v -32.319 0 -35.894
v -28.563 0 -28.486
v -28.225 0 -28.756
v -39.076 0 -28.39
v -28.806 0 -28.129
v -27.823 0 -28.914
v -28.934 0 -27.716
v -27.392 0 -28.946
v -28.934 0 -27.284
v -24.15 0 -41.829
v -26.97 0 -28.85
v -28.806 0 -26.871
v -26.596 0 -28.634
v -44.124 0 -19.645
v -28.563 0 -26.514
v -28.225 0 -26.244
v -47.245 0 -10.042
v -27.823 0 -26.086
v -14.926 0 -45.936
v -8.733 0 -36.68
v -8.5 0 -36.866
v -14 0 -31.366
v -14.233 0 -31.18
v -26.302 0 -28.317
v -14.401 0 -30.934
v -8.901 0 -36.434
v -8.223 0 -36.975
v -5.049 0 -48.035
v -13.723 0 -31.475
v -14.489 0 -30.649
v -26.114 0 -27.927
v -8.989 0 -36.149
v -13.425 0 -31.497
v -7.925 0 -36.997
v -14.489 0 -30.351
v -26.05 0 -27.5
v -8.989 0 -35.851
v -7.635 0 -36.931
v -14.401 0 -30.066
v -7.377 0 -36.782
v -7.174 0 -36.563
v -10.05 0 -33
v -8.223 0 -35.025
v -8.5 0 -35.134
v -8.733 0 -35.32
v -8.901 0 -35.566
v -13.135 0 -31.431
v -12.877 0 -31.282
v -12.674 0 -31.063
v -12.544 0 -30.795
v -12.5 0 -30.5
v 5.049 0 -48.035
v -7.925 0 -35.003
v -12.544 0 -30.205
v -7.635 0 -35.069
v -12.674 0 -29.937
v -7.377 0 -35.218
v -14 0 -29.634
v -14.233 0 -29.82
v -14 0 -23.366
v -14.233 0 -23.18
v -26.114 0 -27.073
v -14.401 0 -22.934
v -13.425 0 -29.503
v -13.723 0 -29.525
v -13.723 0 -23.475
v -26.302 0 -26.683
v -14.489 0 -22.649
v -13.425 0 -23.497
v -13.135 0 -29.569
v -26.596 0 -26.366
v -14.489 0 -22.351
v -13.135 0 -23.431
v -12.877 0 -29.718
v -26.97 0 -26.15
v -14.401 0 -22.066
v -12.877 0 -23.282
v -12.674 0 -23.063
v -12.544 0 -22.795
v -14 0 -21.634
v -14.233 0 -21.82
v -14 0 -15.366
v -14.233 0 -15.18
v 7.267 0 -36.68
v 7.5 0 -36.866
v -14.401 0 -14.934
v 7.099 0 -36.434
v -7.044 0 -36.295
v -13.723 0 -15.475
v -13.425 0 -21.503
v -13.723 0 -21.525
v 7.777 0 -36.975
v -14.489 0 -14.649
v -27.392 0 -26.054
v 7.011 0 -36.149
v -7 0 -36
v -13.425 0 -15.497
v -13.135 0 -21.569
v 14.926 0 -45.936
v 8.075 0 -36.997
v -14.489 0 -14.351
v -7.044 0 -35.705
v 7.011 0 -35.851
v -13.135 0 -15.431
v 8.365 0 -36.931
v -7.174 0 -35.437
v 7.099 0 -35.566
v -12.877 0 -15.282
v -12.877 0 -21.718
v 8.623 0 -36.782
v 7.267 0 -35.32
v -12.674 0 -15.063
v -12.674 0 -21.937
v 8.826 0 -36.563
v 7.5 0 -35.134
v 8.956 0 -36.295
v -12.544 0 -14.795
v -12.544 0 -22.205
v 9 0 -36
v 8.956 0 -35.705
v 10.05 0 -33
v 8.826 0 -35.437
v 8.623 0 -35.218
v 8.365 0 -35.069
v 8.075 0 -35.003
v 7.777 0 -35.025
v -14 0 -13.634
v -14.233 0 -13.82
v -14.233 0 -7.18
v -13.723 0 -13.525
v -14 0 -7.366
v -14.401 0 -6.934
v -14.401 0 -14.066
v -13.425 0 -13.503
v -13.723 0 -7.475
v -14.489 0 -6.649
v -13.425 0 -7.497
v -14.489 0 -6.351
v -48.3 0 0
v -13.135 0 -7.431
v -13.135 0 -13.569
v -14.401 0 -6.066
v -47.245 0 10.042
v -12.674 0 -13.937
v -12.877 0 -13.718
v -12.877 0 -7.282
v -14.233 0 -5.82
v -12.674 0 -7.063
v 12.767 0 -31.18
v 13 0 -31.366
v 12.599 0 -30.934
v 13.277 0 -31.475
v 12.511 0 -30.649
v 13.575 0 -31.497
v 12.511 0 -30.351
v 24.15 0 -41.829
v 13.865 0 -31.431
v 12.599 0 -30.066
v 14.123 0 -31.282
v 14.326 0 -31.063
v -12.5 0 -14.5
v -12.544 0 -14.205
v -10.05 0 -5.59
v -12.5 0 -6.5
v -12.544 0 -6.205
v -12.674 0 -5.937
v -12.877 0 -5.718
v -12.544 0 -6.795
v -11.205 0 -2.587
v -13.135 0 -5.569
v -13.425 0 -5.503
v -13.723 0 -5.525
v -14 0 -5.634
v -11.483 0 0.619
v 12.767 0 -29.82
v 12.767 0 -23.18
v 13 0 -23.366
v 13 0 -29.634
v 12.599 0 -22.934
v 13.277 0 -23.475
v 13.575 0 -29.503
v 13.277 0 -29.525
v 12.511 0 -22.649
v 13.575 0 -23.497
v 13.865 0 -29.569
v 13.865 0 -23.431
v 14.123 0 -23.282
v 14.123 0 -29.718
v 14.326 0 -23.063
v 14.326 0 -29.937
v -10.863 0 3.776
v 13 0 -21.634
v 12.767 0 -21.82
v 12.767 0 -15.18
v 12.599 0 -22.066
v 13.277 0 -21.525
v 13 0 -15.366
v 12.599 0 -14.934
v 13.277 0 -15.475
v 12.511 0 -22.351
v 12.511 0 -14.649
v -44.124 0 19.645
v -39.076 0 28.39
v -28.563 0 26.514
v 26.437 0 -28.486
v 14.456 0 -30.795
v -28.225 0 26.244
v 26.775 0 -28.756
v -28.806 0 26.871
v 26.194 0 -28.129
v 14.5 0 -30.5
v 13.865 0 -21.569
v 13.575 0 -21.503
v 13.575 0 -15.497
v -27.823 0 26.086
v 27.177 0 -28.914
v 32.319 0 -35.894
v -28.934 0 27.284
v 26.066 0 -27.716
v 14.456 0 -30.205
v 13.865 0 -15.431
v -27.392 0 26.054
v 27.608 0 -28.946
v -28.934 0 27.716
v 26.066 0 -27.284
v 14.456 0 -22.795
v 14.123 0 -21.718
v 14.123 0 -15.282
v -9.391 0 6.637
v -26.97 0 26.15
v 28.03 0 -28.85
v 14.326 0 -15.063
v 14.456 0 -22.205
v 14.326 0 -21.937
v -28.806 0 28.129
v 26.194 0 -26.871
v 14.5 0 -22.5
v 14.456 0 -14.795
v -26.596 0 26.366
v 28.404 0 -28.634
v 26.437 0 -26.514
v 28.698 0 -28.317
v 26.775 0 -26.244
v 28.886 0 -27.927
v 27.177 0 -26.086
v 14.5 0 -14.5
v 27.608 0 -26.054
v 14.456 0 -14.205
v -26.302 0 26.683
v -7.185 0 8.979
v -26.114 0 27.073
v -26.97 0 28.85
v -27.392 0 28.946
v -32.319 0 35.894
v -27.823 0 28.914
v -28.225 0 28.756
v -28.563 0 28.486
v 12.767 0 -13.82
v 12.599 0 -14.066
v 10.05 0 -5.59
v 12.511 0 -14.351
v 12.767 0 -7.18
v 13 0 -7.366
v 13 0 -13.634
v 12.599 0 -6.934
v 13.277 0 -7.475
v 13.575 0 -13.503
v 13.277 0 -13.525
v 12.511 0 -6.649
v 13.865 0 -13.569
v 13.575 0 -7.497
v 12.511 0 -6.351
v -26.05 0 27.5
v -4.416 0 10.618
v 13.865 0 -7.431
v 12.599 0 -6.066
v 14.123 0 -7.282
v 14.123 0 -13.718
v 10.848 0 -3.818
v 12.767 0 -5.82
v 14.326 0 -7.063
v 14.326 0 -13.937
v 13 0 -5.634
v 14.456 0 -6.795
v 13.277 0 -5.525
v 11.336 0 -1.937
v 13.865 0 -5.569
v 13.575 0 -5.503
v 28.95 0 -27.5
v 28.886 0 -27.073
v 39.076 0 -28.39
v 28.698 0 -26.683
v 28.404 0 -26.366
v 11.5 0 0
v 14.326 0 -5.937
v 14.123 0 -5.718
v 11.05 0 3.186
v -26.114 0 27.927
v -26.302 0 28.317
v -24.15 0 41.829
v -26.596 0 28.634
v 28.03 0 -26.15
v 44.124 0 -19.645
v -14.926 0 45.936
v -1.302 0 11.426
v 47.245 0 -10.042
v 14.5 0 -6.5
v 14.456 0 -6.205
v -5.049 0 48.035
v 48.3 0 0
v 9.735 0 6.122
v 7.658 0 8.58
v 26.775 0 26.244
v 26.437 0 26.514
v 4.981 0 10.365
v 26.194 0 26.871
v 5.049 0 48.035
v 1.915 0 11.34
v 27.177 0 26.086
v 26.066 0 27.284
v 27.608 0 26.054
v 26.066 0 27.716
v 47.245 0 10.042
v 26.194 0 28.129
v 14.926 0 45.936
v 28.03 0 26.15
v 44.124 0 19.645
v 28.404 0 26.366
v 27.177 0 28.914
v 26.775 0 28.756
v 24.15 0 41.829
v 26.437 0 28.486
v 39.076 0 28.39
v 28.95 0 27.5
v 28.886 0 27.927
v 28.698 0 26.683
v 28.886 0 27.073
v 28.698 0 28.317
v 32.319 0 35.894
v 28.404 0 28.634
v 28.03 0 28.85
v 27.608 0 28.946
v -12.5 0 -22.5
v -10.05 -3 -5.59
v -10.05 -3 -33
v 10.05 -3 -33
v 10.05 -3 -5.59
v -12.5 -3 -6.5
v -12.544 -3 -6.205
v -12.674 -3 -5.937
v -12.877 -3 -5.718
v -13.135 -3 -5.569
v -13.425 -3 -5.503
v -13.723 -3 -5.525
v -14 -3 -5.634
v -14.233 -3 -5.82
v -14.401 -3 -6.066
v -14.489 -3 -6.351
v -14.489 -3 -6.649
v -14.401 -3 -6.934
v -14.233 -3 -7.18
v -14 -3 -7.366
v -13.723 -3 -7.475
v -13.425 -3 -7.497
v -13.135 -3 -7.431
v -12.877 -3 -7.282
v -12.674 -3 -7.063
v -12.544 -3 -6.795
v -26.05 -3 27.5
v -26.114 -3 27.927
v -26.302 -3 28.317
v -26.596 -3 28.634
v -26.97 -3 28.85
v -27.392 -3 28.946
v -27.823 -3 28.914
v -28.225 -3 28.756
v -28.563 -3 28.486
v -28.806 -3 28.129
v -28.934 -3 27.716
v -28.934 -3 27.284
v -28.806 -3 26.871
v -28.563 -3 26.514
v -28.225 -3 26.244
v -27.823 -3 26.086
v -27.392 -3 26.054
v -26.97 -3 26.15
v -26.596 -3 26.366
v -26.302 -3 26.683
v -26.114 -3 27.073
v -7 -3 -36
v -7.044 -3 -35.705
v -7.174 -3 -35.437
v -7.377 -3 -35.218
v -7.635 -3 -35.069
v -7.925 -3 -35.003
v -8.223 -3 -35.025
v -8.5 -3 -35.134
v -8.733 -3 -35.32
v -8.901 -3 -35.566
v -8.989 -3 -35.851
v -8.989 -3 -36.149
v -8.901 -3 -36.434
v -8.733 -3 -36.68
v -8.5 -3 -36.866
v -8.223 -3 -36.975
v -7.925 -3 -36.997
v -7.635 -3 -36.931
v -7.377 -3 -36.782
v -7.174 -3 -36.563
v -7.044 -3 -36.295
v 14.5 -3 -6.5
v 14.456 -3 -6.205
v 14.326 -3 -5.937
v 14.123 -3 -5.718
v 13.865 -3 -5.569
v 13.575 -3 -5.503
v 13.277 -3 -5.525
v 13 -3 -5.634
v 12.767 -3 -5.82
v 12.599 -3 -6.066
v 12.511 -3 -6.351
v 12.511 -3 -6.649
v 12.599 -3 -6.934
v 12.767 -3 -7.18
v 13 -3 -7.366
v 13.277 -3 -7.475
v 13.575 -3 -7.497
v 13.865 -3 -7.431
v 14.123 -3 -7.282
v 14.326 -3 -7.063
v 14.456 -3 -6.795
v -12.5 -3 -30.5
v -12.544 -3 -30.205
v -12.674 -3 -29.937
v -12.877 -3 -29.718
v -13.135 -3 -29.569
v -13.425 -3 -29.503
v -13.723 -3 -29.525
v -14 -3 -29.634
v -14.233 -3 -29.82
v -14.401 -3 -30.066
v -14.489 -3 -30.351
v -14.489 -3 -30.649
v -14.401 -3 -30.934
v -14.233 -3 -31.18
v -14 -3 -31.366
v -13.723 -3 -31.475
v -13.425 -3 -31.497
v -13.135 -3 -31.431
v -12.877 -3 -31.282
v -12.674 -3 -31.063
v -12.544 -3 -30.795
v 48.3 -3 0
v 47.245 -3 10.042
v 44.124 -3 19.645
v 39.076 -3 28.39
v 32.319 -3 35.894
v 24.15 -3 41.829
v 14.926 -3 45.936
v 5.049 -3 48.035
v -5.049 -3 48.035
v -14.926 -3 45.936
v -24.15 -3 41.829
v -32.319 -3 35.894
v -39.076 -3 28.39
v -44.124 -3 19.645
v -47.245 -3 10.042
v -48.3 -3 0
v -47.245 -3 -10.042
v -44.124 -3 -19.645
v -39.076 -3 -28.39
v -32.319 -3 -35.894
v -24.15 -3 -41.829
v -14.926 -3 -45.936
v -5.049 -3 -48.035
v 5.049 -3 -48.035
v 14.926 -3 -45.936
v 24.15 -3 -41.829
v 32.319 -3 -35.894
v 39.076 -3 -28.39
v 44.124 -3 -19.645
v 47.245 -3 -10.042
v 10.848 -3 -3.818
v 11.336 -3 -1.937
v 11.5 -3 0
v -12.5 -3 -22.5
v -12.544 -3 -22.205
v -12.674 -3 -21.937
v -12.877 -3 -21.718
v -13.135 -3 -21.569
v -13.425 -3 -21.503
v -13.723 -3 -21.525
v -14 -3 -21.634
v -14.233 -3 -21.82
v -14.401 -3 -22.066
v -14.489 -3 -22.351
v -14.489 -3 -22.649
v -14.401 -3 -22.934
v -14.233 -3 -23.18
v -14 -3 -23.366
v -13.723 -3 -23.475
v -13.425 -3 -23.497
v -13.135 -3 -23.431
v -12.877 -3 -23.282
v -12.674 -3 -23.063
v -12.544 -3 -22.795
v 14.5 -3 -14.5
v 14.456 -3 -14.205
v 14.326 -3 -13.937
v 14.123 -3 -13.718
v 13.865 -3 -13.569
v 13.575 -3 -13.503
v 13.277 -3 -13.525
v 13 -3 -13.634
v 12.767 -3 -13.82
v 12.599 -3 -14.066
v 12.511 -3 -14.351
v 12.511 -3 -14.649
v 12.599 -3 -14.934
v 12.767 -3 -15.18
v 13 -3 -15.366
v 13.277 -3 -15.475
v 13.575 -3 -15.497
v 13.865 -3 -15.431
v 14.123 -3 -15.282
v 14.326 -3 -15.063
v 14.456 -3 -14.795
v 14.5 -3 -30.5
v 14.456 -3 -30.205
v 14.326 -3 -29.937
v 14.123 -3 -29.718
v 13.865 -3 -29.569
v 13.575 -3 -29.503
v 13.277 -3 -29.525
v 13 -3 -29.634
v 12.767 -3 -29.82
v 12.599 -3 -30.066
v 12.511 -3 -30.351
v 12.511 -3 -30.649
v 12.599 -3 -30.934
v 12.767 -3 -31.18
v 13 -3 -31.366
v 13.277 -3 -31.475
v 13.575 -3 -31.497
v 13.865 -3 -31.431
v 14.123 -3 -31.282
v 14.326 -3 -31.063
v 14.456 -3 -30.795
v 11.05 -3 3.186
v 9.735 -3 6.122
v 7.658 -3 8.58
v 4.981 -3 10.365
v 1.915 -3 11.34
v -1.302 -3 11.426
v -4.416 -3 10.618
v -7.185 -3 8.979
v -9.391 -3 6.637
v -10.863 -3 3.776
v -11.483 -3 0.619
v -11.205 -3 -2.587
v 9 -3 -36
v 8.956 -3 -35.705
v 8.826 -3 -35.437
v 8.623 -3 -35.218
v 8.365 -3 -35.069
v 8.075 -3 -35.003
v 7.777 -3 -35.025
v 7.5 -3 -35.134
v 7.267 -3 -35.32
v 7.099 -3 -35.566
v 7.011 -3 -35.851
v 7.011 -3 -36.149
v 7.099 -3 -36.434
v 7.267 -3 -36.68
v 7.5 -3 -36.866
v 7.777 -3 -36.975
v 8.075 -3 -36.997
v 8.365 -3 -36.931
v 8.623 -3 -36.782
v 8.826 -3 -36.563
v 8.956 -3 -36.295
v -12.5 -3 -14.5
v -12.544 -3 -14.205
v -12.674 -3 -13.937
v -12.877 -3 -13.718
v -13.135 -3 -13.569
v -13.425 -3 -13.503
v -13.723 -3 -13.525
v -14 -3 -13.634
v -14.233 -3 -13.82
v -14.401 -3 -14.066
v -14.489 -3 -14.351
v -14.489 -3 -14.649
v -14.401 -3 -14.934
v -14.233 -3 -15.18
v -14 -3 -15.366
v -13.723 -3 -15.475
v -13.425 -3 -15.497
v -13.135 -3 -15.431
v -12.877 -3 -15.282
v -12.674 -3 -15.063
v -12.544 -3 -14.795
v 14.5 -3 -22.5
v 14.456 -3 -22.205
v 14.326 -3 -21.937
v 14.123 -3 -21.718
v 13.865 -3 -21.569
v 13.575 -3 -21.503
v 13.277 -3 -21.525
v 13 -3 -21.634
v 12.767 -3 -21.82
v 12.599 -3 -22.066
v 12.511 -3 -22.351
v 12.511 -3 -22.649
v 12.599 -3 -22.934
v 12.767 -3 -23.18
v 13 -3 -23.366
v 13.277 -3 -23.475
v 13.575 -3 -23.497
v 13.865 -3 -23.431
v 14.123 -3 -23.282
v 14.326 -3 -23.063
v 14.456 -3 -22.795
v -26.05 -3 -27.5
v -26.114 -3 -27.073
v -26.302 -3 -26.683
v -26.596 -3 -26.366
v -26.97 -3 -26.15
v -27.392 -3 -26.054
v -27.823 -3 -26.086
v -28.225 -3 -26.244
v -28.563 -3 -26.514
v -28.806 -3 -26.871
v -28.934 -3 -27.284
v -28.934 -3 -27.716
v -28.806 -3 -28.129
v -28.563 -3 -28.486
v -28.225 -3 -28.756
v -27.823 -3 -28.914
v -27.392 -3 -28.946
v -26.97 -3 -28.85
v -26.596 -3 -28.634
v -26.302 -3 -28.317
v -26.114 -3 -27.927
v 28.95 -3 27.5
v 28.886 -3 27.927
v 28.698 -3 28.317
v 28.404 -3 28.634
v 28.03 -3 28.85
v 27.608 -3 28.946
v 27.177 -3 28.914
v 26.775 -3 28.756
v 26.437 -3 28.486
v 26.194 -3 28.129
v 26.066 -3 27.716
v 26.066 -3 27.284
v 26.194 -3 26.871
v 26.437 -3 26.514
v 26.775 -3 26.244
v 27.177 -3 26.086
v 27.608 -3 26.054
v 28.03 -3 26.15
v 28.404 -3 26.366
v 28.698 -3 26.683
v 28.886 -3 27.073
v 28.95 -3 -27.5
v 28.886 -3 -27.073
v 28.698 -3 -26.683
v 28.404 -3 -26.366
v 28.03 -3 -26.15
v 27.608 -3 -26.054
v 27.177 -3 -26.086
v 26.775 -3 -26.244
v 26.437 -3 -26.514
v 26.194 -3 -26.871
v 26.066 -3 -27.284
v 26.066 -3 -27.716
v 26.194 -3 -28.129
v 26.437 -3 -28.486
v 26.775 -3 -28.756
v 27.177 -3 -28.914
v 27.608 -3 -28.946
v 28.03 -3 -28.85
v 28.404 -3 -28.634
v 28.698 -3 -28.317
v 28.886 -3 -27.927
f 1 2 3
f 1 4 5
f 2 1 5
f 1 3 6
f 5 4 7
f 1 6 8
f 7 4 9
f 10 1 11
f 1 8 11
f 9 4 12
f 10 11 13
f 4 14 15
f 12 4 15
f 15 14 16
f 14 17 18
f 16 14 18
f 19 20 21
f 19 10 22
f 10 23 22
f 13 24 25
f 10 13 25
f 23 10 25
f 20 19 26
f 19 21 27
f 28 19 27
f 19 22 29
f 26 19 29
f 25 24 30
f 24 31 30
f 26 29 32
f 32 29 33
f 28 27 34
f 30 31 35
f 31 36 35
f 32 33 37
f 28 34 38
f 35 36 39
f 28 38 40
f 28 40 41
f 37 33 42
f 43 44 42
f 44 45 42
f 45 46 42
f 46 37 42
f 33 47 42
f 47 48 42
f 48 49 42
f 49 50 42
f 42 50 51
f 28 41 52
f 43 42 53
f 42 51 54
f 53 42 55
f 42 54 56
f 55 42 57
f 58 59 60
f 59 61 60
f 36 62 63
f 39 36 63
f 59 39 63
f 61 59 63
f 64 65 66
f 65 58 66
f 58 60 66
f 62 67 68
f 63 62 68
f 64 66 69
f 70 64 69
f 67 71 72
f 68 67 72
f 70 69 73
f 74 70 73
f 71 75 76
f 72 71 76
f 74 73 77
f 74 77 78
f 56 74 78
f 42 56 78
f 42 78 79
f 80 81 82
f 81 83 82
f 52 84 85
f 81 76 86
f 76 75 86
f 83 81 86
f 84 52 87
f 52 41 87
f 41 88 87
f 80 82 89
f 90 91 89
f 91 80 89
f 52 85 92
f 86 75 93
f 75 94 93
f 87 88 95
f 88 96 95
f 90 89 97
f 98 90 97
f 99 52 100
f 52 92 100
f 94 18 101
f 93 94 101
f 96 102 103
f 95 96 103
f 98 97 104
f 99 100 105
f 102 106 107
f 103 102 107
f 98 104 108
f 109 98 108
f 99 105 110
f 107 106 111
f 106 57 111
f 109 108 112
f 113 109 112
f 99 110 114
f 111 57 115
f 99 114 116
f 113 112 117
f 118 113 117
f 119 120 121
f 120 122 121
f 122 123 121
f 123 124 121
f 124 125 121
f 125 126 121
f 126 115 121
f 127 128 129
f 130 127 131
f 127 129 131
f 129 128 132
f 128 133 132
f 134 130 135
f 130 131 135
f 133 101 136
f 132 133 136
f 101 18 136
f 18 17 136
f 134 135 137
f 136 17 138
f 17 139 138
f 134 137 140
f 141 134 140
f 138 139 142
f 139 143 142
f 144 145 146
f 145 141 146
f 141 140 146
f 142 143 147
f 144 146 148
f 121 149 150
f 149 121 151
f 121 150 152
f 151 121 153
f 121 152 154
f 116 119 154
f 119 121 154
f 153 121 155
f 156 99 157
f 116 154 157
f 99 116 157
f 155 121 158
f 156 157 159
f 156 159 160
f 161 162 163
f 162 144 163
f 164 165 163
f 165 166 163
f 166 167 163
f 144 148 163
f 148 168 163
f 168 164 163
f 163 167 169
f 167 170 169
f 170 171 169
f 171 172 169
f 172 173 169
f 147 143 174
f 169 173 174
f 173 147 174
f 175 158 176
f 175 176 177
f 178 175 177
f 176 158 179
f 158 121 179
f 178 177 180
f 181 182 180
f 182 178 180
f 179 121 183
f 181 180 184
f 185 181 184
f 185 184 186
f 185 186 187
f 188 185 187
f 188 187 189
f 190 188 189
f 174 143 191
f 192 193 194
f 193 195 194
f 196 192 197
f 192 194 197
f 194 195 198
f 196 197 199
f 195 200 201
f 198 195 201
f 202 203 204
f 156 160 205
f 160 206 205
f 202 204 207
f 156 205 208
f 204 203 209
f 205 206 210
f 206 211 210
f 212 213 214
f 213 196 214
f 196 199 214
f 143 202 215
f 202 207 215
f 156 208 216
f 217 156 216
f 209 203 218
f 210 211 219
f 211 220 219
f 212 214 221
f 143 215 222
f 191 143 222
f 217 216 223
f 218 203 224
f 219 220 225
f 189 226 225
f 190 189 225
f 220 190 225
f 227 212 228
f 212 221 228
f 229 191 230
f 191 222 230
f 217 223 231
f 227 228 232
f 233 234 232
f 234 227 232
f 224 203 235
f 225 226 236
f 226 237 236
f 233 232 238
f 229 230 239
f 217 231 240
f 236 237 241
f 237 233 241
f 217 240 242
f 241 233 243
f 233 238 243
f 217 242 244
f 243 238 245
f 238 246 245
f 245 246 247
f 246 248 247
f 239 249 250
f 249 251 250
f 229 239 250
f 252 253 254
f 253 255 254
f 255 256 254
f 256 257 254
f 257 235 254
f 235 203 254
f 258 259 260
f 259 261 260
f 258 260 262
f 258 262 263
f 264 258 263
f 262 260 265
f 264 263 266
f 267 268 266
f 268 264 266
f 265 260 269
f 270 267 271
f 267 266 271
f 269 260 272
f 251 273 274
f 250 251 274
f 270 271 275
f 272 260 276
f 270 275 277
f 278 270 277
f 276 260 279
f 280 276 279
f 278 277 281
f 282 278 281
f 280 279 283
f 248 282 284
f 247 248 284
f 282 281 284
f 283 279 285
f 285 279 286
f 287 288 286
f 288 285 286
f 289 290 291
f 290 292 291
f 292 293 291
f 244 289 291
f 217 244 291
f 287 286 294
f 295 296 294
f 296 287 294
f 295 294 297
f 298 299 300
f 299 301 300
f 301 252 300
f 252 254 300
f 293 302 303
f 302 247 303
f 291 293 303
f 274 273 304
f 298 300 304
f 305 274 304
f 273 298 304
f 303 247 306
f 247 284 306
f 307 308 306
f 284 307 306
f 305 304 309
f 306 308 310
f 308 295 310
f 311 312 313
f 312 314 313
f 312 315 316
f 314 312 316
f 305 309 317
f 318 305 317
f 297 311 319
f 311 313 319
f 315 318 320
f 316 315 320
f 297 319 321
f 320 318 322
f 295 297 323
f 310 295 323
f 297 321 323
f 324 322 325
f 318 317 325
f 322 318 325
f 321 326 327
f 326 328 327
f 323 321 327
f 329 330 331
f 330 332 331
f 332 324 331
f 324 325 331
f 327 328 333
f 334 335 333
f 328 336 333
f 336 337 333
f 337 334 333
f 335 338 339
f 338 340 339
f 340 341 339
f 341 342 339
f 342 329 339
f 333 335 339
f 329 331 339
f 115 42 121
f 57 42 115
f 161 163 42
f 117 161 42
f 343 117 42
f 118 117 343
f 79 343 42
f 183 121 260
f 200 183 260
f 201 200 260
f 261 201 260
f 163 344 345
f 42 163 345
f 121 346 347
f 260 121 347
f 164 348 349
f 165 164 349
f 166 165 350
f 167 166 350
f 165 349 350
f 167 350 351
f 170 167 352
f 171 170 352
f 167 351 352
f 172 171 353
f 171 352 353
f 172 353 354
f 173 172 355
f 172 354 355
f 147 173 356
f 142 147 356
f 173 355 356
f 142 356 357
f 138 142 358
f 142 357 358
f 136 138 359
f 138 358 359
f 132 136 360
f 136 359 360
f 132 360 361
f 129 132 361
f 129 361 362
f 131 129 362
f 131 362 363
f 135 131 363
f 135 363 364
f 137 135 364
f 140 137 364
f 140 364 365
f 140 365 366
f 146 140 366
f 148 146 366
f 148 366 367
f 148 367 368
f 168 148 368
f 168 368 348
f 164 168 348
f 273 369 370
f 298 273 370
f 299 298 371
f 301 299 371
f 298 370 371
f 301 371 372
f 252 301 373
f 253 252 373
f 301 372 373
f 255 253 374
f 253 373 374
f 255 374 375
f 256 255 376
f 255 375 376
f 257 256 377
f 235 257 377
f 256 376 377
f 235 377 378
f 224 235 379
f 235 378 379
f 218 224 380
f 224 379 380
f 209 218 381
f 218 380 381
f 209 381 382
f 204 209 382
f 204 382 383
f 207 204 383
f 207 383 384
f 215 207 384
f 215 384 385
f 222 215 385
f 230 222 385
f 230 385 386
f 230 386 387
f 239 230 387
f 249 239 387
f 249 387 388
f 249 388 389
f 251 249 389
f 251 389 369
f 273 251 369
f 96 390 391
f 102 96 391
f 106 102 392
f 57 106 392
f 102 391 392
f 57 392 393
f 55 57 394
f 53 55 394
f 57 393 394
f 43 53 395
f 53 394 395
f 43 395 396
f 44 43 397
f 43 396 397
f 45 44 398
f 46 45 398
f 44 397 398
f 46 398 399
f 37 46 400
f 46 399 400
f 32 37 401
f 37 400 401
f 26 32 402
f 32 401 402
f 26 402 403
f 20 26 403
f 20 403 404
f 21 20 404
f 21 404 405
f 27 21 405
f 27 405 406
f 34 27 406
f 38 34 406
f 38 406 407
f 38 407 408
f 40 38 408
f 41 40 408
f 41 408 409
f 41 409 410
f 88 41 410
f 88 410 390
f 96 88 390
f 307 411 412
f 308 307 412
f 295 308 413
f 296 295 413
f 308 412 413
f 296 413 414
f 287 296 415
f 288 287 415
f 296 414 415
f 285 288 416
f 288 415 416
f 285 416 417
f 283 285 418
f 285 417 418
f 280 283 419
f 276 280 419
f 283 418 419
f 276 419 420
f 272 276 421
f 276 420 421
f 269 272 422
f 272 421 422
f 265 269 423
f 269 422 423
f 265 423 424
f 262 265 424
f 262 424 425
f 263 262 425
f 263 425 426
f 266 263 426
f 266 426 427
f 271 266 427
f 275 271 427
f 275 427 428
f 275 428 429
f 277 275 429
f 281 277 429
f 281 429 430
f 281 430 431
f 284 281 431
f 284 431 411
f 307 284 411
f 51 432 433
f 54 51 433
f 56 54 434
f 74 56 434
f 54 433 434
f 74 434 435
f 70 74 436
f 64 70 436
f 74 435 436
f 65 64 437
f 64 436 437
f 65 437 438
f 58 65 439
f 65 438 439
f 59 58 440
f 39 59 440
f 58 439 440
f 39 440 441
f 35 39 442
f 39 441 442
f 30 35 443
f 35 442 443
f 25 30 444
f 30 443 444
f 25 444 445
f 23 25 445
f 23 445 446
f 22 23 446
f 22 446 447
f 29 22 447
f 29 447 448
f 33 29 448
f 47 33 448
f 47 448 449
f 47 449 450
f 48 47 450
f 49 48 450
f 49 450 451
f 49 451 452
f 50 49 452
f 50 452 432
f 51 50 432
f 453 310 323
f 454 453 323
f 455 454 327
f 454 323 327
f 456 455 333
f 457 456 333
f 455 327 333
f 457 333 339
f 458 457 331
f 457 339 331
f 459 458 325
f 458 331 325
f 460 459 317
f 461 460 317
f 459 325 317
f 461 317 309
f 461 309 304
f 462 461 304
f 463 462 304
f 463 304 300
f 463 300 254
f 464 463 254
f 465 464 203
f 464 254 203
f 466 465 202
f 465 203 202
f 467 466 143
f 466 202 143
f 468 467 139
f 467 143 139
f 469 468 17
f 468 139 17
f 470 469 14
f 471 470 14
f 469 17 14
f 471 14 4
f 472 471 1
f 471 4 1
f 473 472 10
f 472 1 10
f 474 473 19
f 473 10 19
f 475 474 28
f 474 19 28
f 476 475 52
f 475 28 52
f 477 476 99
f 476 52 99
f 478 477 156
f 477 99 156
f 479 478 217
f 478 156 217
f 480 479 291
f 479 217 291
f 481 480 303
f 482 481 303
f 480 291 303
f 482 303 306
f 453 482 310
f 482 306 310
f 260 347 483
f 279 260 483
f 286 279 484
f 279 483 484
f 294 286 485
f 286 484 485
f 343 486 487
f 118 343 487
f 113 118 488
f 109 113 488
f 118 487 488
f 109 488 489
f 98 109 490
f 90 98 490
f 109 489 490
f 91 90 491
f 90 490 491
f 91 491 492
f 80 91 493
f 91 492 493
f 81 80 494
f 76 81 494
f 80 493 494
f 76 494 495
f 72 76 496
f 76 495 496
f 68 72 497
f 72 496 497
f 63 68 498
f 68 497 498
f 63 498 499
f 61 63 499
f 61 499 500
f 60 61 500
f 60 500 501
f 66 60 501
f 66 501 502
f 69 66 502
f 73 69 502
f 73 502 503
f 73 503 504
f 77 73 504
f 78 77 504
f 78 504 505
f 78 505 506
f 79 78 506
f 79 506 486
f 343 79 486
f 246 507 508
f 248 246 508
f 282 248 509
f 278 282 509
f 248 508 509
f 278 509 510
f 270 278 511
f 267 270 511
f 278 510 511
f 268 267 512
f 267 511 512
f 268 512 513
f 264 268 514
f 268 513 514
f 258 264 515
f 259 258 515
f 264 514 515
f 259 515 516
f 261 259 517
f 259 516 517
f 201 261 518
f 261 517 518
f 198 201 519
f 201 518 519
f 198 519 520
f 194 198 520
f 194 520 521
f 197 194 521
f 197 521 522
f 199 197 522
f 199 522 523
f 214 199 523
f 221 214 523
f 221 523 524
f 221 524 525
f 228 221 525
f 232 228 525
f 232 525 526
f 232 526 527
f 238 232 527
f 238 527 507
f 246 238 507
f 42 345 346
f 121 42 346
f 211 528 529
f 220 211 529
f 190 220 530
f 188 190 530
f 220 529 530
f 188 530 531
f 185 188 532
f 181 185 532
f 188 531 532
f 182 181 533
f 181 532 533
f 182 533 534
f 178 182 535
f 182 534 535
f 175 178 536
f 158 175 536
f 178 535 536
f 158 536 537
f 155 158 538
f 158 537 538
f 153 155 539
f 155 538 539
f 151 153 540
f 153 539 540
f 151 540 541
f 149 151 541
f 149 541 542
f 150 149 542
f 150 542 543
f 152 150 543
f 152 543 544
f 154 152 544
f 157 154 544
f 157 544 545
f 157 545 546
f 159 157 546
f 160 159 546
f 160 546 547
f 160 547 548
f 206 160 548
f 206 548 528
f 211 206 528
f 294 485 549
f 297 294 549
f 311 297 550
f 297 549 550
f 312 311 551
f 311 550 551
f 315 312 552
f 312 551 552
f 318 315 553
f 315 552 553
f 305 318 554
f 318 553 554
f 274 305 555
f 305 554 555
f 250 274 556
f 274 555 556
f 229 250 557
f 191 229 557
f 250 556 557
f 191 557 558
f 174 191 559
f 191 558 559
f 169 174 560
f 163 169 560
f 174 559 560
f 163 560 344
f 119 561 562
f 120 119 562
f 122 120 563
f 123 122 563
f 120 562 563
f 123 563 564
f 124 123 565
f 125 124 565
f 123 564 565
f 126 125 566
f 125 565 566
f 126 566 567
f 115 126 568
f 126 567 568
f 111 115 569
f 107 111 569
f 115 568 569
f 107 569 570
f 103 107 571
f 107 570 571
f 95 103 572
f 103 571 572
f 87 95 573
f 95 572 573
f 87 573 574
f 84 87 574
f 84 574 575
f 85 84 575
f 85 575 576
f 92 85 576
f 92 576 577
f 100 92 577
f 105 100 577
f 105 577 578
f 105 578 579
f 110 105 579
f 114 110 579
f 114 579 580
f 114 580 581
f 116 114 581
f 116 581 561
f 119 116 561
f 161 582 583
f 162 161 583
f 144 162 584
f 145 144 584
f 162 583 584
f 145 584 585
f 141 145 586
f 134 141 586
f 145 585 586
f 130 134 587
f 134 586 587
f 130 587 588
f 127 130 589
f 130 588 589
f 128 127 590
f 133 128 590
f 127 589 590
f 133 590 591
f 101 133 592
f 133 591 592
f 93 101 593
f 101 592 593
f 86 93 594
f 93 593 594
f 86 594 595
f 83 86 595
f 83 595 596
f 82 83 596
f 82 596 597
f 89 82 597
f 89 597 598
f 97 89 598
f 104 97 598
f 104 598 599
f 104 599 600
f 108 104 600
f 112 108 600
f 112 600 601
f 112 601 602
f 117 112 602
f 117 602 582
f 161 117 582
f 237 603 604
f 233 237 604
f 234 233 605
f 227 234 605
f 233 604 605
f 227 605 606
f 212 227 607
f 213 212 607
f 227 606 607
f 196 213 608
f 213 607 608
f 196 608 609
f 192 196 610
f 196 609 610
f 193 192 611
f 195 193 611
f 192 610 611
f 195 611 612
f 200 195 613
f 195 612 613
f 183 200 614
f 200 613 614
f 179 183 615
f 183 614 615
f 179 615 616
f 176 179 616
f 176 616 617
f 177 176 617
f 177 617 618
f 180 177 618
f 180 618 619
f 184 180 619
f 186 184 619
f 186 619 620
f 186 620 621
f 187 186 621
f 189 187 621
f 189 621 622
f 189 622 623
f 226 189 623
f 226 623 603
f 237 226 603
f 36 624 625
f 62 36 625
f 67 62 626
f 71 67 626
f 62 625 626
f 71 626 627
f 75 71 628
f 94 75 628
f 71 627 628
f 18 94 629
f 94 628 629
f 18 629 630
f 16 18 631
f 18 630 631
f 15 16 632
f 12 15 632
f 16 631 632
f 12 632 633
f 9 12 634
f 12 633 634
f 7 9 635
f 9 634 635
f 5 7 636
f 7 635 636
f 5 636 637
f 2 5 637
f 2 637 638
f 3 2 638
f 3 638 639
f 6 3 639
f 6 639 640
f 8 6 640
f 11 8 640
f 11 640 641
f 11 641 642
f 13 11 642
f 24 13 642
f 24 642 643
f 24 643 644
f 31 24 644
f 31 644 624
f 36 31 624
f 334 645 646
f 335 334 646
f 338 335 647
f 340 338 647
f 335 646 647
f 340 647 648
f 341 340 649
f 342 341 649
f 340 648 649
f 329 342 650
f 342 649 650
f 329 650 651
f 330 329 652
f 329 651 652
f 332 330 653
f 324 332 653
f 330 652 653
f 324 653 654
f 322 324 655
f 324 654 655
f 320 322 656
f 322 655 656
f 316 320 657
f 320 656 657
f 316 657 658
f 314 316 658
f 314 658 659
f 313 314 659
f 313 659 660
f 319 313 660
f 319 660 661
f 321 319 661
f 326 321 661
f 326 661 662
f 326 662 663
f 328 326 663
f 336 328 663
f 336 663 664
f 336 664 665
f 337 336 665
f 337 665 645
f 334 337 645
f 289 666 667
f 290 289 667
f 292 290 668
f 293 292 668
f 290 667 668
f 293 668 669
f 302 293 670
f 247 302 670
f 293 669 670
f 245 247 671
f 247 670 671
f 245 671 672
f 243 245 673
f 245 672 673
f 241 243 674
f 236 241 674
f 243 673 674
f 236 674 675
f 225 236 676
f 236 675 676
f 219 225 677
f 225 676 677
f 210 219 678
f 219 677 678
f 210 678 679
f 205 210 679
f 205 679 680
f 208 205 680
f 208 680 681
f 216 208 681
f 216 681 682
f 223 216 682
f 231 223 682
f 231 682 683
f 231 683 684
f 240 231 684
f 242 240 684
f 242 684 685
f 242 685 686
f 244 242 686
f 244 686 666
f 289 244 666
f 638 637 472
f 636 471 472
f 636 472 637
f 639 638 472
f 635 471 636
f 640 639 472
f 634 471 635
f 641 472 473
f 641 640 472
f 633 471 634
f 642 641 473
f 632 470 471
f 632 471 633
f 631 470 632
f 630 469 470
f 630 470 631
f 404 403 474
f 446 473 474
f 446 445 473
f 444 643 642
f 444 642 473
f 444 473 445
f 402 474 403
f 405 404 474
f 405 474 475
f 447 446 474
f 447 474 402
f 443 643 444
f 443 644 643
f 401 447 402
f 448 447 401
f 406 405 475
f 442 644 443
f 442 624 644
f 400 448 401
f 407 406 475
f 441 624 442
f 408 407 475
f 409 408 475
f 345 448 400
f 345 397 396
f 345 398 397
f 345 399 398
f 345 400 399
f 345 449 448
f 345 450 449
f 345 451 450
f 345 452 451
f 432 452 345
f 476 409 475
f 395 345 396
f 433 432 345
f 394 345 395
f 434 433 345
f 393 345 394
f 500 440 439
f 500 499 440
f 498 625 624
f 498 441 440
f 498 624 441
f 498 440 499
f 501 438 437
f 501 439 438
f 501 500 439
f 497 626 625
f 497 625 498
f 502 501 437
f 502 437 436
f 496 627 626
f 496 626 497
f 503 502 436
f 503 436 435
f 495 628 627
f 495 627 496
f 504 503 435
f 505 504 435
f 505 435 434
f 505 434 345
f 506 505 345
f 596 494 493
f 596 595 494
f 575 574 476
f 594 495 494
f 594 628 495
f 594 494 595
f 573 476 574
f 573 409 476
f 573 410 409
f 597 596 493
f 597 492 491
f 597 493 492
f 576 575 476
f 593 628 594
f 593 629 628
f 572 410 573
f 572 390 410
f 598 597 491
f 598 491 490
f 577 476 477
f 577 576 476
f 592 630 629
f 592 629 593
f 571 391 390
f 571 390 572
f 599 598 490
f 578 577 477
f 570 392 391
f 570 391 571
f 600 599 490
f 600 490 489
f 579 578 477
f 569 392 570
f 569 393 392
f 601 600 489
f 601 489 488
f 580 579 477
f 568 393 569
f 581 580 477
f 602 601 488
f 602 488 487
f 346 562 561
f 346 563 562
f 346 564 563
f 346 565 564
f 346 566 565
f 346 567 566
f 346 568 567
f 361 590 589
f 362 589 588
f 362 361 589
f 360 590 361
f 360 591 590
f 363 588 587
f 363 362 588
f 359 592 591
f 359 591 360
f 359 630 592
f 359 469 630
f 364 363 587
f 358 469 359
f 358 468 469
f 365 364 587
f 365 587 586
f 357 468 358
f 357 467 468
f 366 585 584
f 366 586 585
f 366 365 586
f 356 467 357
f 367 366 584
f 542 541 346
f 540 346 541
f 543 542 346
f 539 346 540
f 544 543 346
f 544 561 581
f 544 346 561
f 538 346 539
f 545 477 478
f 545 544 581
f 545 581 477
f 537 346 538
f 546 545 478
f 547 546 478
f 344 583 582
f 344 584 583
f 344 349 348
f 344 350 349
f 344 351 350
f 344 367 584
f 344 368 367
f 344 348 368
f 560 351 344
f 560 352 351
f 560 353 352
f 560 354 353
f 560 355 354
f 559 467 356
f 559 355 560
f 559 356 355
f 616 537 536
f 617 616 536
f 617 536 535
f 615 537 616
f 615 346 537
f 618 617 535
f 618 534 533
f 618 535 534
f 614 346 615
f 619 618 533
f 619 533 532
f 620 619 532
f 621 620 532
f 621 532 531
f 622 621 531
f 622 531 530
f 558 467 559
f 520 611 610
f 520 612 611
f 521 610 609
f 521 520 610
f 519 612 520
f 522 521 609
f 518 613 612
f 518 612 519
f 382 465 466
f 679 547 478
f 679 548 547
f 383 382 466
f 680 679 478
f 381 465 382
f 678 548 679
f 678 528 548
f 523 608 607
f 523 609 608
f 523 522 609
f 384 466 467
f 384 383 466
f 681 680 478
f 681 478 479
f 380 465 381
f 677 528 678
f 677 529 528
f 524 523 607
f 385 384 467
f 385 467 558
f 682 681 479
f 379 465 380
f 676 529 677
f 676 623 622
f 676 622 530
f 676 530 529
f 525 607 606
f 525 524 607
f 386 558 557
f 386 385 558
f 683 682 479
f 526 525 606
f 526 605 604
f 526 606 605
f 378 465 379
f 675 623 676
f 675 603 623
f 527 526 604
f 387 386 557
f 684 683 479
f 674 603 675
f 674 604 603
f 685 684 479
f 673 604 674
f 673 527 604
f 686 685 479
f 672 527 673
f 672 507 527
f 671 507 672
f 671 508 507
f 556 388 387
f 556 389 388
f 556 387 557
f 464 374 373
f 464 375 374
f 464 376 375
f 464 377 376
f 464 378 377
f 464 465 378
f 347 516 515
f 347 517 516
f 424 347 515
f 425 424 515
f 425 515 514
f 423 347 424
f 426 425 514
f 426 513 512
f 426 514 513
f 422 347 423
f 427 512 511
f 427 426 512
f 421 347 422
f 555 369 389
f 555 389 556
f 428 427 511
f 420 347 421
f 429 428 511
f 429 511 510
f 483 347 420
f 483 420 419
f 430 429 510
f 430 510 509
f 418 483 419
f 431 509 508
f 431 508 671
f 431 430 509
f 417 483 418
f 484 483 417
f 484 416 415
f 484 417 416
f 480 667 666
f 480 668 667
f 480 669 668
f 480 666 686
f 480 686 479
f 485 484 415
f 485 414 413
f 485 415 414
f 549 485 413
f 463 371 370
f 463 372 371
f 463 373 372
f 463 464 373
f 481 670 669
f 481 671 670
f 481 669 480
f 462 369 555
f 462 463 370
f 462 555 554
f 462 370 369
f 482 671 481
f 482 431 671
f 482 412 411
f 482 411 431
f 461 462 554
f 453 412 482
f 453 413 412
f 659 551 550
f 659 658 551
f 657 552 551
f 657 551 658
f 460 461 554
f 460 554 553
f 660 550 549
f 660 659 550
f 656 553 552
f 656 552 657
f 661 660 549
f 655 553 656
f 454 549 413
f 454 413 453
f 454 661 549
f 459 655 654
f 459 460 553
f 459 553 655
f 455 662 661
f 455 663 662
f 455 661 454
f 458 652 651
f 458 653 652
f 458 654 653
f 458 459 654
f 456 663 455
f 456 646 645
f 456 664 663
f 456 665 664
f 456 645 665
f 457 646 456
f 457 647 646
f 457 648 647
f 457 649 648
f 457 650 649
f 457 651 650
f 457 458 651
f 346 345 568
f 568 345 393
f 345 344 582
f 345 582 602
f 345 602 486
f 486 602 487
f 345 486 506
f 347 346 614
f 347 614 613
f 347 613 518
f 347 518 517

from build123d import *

# Parameters (mm, degrees)
F0_R     = 48.3
F1_DEPTH = 3
F2_R     = 1.25
F2_R_2   = 2.5
F3_DEPTH = 3.001
F4_R     = 1.45
F5_DEPTH = 3.001
F6_R     = 1
F7_DEPTH = 3.001


with BuildPart() as f1:
    # F0 (on Front) → F1 (new body)
    with BuildSketch(Plane.XZ):
        Circle(F0_R)
    extrude(amount=F1_DEPTH)

    # F2 (on face) → F3 (cut, through all)
    with BuildSketch(Plane.XZ.offset(3)):
        with Locations((-8, 0)):
            Circle(F2_R)
        with Locations((8, 0)):
            Circle(F2_R)
        Circle(F2_R_2)
    extrude(amount=-F3_DEPTH, mode=Mode.SUBTRACT)

    # F4 (on face) → F5 (cut, through all)
    with BuildSketch(Plane.XZ.offset(3)):
        with Locations((-27.5, 27.5)):
            Circle(F4_R)
        with Locations((27.5, 27.5)):
            Circle(F4_R)
        with Locations((-27.5, -27.5)):
            Circle(F4_R)
        with Locations((27.5, -27.5)):
            Circle(F4_R)
    extrude(amount=-F5_DEPTH, mode=Mode.SUBTRACT)

    # F6 (on face) → F7 (cut, through all)
    with BuildSketch(Plane.XZ.offset(3)):
        with BuildLine():
            Line((-10.05, -33), (10.05, -33))
            Line((10.05, -33), (10.05, -5.5899463325))
            ThreePointArc((10.05, -5.5899463325), (0, -11.5), (-10.05, -5.5899463325))
            Line((-10.05, -5.5899463325), (-10.05, -33))
        make_face()
        with BuildLine():
            ThreePointArc((-10.05, -5.5899463325), (0, -11.5), (10.05, -5.5899463325))
            Line((10.05, -5.5899463325), (10.05, 0))
            Line((10.05, 0), (-10.05, 0))
            Line((-10.05, 0), (-10.05, -5.5899463325))
        make_face()
        with BuildLine():
            Line((10.05, 0), (10.05, -5.5899463325))
            ThreePointArc((10.05, -5.5899463325), (11.1315991663, -2.8874729436), (11.5, 0))
            ThreePointArc((11.5, 0), (-2.8874729436, 11.1315991663), (-10.05, -5.5899463325))
            Line((-10.05, -5.5899463325), (-10.05, 0))
            Line((-10.05, 0), (10.05, 0))
        make_face()
        with Locations((-13.5, -6.5)):
            Circle(F6_R)
        with Locations((-13.5, -14.5)):
            Circle(F6_R)
        with Locations((-13.5, -22.5)):
            Circle(F6_R)
        with Locations((-13.5, -30.5)):
            Circle(F6_R)
        with Locations((13.5, -6.5)):
            Circle(F6_R)
        with Locations((13.5, -14.5)):
            Circle(F6_R)
        with Locations((13.5, -22.5)):
            Circle(F6_R)
        with Locations((13.5, -30.5)):
            Circle(F6_R)
        with Locations((-8, -36)):
            Circle(F6_R)
        with Locations((8, -36)):
            Circle(F6_R)
    extrude(amount=-F7_DEPTH, mode=Mode.SUBTRACT)


solid = f1.part
